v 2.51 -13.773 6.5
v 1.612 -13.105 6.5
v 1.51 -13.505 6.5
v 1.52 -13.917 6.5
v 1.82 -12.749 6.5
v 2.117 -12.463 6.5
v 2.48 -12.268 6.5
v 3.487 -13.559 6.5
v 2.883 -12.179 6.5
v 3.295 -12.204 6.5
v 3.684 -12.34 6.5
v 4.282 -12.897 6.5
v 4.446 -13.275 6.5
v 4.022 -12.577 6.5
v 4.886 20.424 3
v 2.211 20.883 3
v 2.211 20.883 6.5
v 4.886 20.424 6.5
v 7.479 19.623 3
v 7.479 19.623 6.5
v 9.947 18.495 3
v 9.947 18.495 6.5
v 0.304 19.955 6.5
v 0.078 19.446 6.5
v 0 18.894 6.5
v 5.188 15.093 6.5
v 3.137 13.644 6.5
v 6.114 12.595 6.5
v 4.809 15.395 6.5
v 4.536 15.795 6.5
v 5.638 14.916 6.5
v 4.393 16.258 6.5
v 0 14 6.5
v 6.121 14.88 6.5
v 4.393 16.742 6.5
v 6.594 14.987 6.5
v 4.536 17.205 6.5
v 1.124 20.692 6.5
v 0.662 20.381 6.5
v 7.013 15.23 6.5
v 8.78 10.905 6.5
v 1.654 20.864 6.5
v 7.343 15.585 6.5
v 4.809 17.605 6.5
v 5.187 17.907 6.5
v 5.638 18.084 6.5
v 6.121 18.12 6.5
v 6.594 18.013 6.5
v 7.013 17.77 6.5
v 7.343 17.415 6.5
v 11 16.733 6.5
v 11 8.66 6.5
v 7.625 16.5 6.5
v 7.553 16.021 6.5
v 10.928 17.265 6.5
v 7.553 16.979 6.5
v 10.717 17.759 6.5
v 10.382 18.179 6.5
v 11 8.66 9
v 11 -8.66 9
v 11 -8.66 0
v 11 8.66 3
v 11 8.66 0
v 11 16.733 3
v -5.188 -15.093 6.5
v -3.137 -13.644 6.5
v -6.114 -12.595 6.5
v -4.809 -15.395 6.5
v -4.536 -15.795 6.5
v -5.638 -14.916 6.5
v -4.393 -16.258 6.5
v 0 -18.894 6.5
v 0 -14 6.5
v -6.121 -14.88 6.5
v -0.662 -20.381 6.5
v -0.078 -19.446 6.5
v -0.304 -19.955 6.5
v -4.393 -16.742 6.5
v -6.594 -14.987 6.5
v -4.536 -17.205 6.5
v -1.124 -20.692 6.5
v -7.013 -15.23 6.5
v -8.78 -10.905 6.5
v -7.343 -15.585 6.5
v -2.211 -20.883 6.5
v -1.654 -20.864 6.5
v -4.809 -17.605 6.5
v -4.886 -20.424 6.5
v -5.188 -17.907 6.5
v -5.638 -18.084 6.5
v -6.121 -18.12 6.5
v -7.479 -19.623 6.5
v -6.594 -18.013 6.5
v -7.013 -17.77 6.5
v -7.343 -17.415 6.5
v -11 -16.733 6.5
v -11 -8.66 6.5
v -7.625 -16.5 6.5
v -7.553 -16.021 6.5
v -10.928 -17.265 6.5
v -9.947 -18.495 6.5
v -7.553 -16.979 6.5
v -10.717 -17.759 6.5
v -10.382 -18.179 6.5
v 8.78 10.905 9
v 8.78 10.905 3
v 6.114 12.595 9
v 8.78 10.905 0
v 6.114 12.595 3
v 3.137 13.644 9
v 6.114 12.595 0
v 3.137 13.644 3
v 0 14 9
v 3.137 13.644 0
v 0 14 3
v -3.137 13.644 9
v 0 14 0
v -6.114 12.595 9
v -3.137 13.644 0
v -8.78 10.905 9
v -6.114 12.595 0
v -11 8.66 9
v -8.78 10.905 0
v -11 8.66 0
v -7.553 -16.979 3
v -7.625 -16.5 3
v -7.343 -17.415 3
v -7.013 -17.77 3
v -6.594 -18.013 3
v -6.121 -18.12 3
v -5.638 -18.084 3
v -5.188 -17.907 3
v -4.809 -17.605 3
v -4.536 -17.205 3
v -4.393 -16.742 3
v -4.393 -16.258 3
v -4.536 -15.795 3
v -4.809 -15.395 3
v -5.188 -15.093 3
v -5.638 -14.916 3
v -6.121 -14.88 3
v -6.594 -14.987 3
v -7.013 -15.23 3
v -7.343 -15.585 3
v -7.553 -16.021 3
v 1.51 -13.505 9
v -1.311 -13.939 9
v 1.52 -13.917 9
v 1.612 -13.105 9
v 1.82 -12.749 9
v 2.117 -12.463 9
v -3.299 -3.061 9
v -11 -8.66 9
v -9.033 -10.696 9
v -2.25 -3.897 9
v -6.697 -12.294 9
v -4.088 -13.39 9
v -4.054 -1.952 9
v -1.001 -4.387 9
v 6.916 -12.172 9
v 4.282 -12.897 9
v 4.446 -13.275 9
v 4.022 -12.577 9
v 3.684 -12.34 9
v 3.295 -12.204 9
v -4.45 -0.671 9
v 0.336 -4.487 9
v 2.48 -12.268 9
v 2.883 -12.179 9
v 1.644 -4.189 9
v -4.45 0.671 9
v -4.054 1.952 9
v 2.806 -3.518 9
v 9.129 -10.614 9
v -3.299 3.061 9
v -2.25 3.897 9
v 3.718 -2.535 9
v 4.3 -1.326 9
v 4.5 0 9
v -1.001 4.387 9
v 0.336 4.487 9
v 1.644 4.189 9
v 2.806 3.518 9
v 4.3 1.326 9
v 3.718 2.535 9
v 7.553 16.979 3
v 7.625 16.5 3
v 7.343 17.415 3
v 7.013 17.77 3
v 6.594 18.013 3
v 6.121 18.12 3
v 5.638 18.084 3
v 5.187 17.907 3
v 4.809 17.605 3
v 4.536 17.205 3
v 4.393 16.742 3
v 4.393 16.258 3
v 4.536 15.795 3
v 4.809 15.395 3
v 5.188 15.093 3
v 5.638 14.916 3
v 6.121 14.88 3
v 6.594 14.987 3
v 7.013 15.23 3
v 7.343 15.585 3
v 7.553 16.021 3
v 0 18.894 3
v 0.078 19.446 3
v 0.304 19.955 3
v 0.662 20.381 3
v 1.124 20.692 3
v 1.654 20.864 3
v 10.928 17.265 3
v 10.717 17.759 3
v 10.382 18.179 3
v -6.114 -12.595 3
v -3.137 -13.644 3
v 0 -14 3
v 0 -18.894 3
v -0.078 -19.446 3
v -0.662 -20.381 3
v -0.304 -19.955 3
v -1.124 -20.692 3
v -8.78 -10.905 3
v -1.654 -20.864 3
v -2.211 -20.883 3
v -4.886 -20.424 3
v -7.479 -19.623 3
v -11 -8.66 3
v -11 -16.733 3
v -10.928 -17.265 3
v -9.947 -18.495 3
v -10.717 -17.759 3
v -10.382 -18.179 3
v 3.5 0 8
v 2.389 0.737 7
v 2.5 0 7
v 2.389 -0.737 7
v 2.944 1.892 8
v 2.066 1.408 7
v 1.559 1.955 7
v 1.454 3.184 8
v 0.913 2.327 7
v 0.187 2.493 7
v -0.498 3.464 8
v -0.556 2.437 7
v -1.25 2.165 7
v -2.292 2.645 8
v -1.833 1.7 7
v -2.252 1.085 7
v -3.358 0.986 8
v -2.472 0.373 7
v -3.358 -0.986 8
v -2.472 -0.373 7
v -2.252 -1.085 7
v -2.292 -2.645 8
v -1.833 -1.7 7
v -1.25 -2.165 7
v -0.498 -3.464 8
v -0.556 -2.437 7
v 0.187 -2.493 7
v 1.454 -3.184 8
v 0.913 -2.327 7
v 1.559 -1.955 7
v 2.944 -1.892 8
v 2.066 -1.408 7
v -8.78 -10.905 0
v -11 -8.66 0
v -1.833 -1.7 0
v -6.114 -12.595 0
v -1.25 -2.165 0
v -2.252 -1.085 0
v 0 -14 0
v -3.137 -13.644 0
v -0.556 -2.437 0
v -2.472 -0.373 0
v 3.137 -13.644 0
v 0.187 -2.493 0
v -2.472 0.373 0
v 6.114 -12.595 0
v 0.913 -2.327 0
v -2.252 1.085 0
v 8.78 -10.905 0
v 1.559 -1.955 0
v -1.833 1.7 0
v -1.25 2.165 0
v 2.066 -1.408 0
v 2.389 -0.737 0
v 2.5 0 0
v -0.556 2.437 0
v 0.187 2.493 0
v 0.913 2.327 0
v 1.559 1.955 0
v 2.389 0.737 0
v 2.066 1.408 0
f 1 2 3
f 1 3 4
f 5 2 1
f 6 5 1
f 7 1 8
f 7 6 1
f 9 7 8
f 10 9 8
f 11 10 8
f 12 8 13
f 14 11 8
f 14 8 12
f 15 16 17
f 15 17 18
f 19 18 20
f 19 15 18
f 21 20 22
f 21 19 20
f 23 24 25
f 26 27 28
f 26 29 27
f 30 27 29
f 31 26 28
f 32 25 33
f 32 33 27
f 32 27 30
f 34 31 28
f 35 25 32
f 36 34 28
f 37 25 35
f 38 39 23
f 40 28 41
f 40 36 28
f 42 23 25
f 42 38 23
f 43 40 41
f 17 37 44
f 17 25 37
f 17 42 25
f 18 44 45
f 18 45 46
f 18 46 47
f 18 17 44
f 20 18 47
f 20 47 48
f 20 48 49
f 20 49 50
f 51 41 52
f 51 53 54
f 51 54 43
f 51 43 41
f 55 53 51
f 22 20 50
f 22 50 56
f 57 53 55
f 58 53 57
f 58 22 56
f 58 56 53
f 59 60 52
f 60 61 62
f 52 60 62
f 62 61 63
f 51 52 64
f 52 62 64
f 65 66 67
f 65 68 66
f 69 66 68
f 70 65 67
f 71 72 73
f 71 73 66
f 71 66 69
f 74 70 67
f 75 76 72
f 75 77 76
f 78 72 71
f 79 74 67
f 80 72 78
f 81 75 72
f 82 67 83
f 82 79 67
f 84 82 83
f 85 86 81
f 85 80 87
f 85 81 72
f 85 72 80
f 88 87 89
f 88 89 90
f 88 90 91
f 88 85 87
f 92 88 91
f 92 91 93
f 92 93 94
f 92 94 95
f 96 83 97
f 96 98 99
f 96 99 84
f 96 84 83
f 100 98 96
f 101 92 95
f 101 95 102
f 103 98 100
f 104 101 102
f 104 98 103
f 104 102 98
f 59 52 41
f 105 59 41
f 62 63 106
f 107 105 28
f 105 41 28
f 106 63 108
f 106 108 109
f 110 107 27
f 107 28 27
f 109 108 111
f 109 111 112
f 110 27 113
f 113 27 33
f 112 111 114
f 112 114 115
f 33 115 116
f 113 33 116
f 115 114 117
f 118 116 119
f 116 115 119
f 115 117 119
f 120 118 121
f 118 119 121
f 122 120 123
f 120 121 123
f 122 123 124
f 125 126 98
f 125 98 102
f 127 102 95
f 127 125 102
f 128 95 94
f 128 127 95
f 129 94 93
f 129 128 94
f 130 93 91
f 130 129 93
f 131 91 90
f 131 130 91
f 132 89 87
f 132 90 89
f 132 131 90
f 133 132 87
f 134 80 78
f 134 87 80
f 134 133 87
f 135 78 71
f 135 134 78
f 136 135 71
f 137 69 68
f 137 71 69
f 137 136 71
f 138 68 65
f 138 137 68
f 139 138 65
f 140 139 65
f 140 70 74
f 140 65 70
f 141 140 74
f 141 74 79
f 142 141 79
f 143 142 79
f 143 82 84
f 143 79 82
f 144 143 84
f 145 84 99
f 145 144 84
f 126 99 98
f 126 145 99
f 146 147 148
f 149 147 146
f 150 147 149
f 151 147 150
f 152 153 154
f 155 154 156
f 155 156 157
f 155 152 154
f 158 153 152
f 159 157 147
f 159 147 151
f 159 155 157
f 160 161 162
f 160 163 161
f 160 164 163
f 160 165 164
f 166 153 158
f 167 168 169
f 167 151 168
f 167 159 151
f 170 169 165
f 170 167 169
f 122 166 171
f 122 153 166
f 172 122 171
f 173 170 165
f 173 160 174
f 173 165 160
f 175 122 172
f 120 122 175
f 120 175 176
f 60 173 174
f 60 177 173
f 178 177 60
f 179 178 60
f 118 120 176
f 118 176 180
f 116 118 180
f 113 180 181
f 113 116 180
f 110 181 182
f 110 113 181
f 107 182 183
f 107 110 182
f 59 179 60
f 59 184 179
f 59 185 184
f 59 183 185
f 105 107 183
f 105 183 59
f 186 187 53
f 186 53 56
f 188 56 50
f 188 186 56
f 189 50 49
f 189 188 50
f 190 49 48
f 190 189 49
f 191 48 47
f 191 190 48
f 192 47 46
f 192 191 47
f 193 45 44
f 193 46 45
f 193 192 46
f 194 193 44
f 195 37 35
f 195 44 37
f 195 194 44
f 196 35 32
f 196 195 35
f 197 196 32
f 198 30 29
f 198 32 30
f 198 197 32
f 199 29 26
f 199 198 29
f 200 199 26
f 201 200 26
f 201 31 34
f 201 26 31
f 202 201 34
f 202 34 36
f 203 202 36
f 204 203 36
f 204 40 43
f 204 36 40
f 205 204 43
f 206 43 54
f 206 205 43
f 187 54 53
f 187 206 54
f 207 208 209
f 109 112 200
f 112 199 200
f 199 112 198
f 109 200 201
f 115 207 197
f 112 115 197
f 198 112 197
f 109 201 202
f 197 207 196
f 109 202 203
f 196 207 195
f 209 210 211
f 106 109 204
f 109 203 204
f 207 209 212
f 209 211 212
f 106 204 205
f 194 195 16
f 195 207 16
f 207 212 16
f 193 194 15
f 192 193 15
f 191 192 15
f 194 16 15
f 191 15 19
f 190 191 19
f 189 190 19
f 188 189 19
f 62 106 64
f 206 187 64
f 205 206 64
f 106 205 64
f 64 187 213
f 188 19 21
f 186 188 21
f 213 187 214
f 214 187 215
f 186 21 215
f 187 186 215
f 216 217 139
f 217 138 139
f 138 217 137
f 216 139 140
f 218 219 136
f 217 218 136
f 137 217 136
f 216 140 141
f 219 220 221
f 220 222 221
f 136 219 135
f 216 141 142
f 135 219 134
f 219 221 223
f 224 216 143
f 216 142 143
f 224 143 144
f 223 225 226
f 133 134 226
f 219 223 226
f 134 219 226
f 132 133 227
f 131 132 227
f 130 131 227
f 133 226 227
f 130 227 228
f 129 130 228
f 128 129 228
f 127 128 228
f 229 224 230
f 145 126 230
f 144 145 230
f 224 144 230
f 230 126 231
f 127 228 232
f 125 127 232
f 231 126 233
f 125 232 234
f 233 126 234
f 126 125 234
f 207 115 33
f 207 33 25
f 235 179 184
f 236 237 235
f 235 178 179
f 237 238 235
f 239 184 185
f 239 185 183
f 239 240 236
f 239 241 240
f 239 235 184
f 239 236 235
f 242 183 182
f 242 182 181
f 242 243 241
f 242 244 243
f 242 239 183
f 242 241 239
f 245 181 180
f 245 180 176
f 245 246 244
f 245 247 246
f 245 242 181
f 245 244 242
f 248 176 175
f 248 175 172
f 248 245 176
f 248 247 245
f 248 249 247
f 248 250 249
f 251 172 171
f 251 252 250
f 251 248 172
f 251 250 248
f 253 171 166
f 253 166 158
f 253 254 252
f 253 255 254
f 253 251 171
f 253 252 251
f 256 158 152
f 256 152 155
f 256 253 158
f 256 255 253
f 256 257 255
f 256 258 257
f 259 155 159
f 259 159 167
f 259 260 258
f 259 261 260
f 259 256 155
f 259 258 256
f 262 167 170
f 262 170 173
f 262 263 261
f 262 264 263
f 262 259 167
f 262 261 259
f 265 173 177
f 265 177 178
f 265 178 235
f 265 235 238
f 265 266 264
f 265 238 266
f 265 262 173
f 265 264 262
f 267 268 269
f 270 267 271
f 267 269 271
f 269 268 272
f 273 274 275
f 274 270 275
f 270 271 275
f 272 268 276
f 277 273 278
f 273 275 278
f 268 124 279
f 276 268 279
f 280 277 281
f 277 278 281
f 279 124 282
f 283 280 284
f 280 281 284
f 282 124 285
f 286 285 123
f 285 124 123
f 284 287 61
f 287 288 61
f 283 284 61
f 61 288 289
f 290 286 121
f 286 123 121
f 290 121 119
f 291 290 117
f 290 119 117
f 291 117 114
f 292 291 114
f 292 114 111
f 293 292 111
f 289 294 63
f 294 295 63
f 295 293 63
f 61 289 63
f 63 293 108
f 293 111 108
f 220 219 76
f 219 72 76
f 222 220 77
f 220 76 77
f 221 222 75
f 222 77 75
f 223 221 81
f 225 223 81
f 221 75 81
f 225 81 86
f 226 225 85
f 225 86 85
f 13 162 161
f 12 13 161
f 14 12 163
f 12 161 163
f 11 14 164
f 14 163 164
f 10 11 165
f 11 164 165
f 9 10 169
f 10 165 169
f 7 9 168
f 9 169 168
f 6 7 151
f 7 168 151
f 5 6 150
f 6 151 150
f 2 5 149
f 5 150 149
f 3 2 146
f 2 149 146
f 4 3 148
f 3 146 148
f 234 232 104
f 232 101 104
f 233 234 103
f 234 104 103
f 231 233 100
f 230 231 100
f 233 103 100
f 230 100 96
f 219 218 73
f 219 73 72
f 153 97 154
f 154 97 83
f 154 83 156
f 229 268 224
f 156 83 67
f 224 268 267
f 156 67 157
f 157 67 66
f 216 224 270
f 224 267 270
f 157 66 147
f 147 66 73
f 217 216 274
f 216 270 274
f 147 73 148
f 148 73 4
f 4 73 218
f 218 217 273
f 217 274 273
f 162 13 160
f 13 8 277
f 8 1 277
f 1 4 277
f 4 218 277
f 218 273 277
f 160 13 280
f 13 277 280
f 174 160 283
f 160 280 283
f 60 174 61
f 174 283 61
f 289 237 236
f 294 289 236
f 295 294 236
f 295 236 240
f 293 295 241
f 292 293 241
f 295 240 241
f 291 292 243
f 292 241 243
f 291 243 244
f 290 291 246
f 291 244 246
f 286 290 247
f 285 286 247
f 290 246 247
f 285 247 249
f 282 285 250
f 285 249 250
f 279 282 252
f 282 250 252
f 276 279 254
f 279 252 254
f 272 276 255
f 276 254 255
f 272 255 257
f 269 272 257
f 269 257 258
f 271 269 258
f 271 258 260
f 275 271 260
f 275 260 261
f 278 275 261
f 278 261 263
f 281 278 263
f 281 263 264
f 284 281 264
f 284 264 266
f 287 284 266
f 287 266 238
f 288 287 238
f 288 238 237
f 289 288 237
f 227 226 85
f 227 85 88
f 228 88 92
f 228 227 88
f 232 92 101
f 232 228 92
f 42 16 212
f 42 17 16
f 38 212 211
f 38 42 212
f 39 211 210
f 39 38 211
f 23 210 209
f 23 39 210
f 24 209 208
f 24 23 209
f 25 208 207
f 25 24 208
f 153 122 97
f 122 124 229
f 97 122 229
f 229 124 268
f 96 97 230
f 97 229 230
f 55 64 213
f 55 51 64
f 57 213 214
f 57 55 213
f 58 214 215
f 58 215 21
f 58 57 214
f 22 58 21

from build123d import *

# Parameters (mm, degrees)
SKETCH1_R           = 14
BOSS_EXTRUDE1_DEPTH = 9
SKETCH2_OUTSIDE_W   = 38.122
SKETCH2_OUTSIDE_H   = 38.122
SKETCH2_OUTSIDE_W_2 = 22
SKETCH2_OUTSIDE_H_2 = 28
CUT_EXTRUDE1_DEPTH  = 22.748563171
SKETCH3_R           = 2.5
CUT_EXTRUDE2_DEPTH  = 20.949937343
CHAMFER1_SIZE       = 2
BOSS_EXTRUDE2_START = 3
SKETCH4_W           = 11
SKETCH4_H           = 12.339745962
BOSS_EXTRUDE2_DEPTH = 3.5
SKETCH5_R           = 1.625
CUT_EXTRUDE3_DEPTH  = 26.357444666
CUT_EXTRUDE4_START  = 3
CUT_EXTRUDE4_DEPTH  = 3.5
CIRPATTERN1_COUNT   = 2
FILLET1_R           = 2
SKETCH7_R           = 1.5
CUT_EXTRUDE5_DEPTH  = 2.5


# Read off the part's stored shape, not the designer's step: Cut-Extrude4
with BuildPart() as part:
    # Sketch1 → Boss-Extrude1 (new body)
    with BuildSketch(Plane.XY):
        Circle(SKETCH1_R)
    extrude(amount=BOSS_EXTRUDE1_DEPTH)

    # Sketch2 outside → Cut-Extrude1 (cut, through all)
    with BuildSketch(Plane.XY):
        Rectangle(SKETCH2_OUTSIDE_W, SKETCH2_OUTSIDE_H)
        Rectangle(SKETCH2_OUTSIDE_W_2, SKETCH2_OUTSIDE_H_2, mode=Mode.SUBTRACT)
    extrude(amount=CUT_EXTRUDE1_DEPTH, mode=Mode.SUBTRACT)

    # Sketch3 → Cut-Extrude2 (cut, through all)
    with BuildSketch(Plane.XY.offset(9)):
        Circle(SKETCH3_R)
    extrude(amount=-CUT_EXTRUDE2_DEPTH, mode=Mode.SUBTRACT)

    # Chamfer1
    chamfer1_edges = [part.edges().sort_by_distance(p)[0] for p in [
        (-2.5, 0, 9),
    ]]
    chamfer(chamfer1_edges, length=CHAMFER1_SIZE)

    # Sketch4 → Boss-Extrude2 (add)
    with BuildSketch(Plane.XY.offset(BOSS_EXTRUDE2_START)):
        with Locations((5.5, 14.830127019)):
            Rectangle(SKETCH4_W, SKETCH4_H)
    boss_extrude2 = extrude(amount=BOSS_EXTRUDE2_DEPTH)

    # Sketch5 → Cut-Extrude3 (cut, through all)
    with BuildSketch(Plane.XY):
        with Locations((6, 16.5)):
            Circle(SKETCH5_R)
    cut_extrude3 = extrude(amount=CUT_EXTRUDE3_DEPTH, mode=Mode.SUBTRACT)

    # Cut-Extrude4 outline → Cut-Extrude4 (cut)
    with BuildSketch(Plane.XY.offset(CUT_EXTRUDE4_START)):
        with BuildLine():
            Line((11, 21), (0, 21))
            ThreePointArc((0, 21), (5.715793024, 20.20716977), (11, 17.88854382))
            Line((11, 17.88854382), (11, 21))
        make_face()
    cut_extrude4 = extrude(amount=CUT_EXTRUDE4_DEPTH, mode=Mode.SUBTRACT)

    # CirPattern1: Boss-Extrude2, Cut-Extrude3, Cut-Extrude4 ×2 about axis
    cirpattern1_axis = Axis((0, 0, 0), (0, 0, 1))
    add([boss_extrude2.rotate(cirpattern1_axis, i * 360 / CIRPATTERN1_COUNT) for i in range(1, CIRPATTERN1_COUNT)])
    add([cut_extrude3.rotate(cirpattern1_axis, i * 360 / CIRPATTERN1_COUNT) for i in range(1, CIRPATTERN1_COUNT)], mode=Mode.SUBTRACT)
    add([cut_extrude4.rotate(cirpattern1_axis, i * 360 / CIRPATTERN1_COUNT) for i in range(1, CIRPATTERN1_COUNT)], mode=Mode.SUBTRACT)

    # Fillet1
    fillet1_edges = [part.edges().sort_by_distance(p)[0] for p in [
        (-11, -17.88854382, 4.75),
        (0, 21, 4.75),
        (11, 17.88854382, 4.75),
        (0, -21, 4.75),
    ]]
    fillet(fillet1_edges, radius=FILLET1_R)

    # Sketch7 → Cut-Extrude5 (cut)
    with BuildSketch(Plane.XY.offset(9)):
        with Locations((3, -13.674794331)):
            Circle(SKETCH7_R)
    extrude(amount=-CUT_EXTRUDE5_DEPTH, mode=Mode.SUBTRACT)


solid = part.part
